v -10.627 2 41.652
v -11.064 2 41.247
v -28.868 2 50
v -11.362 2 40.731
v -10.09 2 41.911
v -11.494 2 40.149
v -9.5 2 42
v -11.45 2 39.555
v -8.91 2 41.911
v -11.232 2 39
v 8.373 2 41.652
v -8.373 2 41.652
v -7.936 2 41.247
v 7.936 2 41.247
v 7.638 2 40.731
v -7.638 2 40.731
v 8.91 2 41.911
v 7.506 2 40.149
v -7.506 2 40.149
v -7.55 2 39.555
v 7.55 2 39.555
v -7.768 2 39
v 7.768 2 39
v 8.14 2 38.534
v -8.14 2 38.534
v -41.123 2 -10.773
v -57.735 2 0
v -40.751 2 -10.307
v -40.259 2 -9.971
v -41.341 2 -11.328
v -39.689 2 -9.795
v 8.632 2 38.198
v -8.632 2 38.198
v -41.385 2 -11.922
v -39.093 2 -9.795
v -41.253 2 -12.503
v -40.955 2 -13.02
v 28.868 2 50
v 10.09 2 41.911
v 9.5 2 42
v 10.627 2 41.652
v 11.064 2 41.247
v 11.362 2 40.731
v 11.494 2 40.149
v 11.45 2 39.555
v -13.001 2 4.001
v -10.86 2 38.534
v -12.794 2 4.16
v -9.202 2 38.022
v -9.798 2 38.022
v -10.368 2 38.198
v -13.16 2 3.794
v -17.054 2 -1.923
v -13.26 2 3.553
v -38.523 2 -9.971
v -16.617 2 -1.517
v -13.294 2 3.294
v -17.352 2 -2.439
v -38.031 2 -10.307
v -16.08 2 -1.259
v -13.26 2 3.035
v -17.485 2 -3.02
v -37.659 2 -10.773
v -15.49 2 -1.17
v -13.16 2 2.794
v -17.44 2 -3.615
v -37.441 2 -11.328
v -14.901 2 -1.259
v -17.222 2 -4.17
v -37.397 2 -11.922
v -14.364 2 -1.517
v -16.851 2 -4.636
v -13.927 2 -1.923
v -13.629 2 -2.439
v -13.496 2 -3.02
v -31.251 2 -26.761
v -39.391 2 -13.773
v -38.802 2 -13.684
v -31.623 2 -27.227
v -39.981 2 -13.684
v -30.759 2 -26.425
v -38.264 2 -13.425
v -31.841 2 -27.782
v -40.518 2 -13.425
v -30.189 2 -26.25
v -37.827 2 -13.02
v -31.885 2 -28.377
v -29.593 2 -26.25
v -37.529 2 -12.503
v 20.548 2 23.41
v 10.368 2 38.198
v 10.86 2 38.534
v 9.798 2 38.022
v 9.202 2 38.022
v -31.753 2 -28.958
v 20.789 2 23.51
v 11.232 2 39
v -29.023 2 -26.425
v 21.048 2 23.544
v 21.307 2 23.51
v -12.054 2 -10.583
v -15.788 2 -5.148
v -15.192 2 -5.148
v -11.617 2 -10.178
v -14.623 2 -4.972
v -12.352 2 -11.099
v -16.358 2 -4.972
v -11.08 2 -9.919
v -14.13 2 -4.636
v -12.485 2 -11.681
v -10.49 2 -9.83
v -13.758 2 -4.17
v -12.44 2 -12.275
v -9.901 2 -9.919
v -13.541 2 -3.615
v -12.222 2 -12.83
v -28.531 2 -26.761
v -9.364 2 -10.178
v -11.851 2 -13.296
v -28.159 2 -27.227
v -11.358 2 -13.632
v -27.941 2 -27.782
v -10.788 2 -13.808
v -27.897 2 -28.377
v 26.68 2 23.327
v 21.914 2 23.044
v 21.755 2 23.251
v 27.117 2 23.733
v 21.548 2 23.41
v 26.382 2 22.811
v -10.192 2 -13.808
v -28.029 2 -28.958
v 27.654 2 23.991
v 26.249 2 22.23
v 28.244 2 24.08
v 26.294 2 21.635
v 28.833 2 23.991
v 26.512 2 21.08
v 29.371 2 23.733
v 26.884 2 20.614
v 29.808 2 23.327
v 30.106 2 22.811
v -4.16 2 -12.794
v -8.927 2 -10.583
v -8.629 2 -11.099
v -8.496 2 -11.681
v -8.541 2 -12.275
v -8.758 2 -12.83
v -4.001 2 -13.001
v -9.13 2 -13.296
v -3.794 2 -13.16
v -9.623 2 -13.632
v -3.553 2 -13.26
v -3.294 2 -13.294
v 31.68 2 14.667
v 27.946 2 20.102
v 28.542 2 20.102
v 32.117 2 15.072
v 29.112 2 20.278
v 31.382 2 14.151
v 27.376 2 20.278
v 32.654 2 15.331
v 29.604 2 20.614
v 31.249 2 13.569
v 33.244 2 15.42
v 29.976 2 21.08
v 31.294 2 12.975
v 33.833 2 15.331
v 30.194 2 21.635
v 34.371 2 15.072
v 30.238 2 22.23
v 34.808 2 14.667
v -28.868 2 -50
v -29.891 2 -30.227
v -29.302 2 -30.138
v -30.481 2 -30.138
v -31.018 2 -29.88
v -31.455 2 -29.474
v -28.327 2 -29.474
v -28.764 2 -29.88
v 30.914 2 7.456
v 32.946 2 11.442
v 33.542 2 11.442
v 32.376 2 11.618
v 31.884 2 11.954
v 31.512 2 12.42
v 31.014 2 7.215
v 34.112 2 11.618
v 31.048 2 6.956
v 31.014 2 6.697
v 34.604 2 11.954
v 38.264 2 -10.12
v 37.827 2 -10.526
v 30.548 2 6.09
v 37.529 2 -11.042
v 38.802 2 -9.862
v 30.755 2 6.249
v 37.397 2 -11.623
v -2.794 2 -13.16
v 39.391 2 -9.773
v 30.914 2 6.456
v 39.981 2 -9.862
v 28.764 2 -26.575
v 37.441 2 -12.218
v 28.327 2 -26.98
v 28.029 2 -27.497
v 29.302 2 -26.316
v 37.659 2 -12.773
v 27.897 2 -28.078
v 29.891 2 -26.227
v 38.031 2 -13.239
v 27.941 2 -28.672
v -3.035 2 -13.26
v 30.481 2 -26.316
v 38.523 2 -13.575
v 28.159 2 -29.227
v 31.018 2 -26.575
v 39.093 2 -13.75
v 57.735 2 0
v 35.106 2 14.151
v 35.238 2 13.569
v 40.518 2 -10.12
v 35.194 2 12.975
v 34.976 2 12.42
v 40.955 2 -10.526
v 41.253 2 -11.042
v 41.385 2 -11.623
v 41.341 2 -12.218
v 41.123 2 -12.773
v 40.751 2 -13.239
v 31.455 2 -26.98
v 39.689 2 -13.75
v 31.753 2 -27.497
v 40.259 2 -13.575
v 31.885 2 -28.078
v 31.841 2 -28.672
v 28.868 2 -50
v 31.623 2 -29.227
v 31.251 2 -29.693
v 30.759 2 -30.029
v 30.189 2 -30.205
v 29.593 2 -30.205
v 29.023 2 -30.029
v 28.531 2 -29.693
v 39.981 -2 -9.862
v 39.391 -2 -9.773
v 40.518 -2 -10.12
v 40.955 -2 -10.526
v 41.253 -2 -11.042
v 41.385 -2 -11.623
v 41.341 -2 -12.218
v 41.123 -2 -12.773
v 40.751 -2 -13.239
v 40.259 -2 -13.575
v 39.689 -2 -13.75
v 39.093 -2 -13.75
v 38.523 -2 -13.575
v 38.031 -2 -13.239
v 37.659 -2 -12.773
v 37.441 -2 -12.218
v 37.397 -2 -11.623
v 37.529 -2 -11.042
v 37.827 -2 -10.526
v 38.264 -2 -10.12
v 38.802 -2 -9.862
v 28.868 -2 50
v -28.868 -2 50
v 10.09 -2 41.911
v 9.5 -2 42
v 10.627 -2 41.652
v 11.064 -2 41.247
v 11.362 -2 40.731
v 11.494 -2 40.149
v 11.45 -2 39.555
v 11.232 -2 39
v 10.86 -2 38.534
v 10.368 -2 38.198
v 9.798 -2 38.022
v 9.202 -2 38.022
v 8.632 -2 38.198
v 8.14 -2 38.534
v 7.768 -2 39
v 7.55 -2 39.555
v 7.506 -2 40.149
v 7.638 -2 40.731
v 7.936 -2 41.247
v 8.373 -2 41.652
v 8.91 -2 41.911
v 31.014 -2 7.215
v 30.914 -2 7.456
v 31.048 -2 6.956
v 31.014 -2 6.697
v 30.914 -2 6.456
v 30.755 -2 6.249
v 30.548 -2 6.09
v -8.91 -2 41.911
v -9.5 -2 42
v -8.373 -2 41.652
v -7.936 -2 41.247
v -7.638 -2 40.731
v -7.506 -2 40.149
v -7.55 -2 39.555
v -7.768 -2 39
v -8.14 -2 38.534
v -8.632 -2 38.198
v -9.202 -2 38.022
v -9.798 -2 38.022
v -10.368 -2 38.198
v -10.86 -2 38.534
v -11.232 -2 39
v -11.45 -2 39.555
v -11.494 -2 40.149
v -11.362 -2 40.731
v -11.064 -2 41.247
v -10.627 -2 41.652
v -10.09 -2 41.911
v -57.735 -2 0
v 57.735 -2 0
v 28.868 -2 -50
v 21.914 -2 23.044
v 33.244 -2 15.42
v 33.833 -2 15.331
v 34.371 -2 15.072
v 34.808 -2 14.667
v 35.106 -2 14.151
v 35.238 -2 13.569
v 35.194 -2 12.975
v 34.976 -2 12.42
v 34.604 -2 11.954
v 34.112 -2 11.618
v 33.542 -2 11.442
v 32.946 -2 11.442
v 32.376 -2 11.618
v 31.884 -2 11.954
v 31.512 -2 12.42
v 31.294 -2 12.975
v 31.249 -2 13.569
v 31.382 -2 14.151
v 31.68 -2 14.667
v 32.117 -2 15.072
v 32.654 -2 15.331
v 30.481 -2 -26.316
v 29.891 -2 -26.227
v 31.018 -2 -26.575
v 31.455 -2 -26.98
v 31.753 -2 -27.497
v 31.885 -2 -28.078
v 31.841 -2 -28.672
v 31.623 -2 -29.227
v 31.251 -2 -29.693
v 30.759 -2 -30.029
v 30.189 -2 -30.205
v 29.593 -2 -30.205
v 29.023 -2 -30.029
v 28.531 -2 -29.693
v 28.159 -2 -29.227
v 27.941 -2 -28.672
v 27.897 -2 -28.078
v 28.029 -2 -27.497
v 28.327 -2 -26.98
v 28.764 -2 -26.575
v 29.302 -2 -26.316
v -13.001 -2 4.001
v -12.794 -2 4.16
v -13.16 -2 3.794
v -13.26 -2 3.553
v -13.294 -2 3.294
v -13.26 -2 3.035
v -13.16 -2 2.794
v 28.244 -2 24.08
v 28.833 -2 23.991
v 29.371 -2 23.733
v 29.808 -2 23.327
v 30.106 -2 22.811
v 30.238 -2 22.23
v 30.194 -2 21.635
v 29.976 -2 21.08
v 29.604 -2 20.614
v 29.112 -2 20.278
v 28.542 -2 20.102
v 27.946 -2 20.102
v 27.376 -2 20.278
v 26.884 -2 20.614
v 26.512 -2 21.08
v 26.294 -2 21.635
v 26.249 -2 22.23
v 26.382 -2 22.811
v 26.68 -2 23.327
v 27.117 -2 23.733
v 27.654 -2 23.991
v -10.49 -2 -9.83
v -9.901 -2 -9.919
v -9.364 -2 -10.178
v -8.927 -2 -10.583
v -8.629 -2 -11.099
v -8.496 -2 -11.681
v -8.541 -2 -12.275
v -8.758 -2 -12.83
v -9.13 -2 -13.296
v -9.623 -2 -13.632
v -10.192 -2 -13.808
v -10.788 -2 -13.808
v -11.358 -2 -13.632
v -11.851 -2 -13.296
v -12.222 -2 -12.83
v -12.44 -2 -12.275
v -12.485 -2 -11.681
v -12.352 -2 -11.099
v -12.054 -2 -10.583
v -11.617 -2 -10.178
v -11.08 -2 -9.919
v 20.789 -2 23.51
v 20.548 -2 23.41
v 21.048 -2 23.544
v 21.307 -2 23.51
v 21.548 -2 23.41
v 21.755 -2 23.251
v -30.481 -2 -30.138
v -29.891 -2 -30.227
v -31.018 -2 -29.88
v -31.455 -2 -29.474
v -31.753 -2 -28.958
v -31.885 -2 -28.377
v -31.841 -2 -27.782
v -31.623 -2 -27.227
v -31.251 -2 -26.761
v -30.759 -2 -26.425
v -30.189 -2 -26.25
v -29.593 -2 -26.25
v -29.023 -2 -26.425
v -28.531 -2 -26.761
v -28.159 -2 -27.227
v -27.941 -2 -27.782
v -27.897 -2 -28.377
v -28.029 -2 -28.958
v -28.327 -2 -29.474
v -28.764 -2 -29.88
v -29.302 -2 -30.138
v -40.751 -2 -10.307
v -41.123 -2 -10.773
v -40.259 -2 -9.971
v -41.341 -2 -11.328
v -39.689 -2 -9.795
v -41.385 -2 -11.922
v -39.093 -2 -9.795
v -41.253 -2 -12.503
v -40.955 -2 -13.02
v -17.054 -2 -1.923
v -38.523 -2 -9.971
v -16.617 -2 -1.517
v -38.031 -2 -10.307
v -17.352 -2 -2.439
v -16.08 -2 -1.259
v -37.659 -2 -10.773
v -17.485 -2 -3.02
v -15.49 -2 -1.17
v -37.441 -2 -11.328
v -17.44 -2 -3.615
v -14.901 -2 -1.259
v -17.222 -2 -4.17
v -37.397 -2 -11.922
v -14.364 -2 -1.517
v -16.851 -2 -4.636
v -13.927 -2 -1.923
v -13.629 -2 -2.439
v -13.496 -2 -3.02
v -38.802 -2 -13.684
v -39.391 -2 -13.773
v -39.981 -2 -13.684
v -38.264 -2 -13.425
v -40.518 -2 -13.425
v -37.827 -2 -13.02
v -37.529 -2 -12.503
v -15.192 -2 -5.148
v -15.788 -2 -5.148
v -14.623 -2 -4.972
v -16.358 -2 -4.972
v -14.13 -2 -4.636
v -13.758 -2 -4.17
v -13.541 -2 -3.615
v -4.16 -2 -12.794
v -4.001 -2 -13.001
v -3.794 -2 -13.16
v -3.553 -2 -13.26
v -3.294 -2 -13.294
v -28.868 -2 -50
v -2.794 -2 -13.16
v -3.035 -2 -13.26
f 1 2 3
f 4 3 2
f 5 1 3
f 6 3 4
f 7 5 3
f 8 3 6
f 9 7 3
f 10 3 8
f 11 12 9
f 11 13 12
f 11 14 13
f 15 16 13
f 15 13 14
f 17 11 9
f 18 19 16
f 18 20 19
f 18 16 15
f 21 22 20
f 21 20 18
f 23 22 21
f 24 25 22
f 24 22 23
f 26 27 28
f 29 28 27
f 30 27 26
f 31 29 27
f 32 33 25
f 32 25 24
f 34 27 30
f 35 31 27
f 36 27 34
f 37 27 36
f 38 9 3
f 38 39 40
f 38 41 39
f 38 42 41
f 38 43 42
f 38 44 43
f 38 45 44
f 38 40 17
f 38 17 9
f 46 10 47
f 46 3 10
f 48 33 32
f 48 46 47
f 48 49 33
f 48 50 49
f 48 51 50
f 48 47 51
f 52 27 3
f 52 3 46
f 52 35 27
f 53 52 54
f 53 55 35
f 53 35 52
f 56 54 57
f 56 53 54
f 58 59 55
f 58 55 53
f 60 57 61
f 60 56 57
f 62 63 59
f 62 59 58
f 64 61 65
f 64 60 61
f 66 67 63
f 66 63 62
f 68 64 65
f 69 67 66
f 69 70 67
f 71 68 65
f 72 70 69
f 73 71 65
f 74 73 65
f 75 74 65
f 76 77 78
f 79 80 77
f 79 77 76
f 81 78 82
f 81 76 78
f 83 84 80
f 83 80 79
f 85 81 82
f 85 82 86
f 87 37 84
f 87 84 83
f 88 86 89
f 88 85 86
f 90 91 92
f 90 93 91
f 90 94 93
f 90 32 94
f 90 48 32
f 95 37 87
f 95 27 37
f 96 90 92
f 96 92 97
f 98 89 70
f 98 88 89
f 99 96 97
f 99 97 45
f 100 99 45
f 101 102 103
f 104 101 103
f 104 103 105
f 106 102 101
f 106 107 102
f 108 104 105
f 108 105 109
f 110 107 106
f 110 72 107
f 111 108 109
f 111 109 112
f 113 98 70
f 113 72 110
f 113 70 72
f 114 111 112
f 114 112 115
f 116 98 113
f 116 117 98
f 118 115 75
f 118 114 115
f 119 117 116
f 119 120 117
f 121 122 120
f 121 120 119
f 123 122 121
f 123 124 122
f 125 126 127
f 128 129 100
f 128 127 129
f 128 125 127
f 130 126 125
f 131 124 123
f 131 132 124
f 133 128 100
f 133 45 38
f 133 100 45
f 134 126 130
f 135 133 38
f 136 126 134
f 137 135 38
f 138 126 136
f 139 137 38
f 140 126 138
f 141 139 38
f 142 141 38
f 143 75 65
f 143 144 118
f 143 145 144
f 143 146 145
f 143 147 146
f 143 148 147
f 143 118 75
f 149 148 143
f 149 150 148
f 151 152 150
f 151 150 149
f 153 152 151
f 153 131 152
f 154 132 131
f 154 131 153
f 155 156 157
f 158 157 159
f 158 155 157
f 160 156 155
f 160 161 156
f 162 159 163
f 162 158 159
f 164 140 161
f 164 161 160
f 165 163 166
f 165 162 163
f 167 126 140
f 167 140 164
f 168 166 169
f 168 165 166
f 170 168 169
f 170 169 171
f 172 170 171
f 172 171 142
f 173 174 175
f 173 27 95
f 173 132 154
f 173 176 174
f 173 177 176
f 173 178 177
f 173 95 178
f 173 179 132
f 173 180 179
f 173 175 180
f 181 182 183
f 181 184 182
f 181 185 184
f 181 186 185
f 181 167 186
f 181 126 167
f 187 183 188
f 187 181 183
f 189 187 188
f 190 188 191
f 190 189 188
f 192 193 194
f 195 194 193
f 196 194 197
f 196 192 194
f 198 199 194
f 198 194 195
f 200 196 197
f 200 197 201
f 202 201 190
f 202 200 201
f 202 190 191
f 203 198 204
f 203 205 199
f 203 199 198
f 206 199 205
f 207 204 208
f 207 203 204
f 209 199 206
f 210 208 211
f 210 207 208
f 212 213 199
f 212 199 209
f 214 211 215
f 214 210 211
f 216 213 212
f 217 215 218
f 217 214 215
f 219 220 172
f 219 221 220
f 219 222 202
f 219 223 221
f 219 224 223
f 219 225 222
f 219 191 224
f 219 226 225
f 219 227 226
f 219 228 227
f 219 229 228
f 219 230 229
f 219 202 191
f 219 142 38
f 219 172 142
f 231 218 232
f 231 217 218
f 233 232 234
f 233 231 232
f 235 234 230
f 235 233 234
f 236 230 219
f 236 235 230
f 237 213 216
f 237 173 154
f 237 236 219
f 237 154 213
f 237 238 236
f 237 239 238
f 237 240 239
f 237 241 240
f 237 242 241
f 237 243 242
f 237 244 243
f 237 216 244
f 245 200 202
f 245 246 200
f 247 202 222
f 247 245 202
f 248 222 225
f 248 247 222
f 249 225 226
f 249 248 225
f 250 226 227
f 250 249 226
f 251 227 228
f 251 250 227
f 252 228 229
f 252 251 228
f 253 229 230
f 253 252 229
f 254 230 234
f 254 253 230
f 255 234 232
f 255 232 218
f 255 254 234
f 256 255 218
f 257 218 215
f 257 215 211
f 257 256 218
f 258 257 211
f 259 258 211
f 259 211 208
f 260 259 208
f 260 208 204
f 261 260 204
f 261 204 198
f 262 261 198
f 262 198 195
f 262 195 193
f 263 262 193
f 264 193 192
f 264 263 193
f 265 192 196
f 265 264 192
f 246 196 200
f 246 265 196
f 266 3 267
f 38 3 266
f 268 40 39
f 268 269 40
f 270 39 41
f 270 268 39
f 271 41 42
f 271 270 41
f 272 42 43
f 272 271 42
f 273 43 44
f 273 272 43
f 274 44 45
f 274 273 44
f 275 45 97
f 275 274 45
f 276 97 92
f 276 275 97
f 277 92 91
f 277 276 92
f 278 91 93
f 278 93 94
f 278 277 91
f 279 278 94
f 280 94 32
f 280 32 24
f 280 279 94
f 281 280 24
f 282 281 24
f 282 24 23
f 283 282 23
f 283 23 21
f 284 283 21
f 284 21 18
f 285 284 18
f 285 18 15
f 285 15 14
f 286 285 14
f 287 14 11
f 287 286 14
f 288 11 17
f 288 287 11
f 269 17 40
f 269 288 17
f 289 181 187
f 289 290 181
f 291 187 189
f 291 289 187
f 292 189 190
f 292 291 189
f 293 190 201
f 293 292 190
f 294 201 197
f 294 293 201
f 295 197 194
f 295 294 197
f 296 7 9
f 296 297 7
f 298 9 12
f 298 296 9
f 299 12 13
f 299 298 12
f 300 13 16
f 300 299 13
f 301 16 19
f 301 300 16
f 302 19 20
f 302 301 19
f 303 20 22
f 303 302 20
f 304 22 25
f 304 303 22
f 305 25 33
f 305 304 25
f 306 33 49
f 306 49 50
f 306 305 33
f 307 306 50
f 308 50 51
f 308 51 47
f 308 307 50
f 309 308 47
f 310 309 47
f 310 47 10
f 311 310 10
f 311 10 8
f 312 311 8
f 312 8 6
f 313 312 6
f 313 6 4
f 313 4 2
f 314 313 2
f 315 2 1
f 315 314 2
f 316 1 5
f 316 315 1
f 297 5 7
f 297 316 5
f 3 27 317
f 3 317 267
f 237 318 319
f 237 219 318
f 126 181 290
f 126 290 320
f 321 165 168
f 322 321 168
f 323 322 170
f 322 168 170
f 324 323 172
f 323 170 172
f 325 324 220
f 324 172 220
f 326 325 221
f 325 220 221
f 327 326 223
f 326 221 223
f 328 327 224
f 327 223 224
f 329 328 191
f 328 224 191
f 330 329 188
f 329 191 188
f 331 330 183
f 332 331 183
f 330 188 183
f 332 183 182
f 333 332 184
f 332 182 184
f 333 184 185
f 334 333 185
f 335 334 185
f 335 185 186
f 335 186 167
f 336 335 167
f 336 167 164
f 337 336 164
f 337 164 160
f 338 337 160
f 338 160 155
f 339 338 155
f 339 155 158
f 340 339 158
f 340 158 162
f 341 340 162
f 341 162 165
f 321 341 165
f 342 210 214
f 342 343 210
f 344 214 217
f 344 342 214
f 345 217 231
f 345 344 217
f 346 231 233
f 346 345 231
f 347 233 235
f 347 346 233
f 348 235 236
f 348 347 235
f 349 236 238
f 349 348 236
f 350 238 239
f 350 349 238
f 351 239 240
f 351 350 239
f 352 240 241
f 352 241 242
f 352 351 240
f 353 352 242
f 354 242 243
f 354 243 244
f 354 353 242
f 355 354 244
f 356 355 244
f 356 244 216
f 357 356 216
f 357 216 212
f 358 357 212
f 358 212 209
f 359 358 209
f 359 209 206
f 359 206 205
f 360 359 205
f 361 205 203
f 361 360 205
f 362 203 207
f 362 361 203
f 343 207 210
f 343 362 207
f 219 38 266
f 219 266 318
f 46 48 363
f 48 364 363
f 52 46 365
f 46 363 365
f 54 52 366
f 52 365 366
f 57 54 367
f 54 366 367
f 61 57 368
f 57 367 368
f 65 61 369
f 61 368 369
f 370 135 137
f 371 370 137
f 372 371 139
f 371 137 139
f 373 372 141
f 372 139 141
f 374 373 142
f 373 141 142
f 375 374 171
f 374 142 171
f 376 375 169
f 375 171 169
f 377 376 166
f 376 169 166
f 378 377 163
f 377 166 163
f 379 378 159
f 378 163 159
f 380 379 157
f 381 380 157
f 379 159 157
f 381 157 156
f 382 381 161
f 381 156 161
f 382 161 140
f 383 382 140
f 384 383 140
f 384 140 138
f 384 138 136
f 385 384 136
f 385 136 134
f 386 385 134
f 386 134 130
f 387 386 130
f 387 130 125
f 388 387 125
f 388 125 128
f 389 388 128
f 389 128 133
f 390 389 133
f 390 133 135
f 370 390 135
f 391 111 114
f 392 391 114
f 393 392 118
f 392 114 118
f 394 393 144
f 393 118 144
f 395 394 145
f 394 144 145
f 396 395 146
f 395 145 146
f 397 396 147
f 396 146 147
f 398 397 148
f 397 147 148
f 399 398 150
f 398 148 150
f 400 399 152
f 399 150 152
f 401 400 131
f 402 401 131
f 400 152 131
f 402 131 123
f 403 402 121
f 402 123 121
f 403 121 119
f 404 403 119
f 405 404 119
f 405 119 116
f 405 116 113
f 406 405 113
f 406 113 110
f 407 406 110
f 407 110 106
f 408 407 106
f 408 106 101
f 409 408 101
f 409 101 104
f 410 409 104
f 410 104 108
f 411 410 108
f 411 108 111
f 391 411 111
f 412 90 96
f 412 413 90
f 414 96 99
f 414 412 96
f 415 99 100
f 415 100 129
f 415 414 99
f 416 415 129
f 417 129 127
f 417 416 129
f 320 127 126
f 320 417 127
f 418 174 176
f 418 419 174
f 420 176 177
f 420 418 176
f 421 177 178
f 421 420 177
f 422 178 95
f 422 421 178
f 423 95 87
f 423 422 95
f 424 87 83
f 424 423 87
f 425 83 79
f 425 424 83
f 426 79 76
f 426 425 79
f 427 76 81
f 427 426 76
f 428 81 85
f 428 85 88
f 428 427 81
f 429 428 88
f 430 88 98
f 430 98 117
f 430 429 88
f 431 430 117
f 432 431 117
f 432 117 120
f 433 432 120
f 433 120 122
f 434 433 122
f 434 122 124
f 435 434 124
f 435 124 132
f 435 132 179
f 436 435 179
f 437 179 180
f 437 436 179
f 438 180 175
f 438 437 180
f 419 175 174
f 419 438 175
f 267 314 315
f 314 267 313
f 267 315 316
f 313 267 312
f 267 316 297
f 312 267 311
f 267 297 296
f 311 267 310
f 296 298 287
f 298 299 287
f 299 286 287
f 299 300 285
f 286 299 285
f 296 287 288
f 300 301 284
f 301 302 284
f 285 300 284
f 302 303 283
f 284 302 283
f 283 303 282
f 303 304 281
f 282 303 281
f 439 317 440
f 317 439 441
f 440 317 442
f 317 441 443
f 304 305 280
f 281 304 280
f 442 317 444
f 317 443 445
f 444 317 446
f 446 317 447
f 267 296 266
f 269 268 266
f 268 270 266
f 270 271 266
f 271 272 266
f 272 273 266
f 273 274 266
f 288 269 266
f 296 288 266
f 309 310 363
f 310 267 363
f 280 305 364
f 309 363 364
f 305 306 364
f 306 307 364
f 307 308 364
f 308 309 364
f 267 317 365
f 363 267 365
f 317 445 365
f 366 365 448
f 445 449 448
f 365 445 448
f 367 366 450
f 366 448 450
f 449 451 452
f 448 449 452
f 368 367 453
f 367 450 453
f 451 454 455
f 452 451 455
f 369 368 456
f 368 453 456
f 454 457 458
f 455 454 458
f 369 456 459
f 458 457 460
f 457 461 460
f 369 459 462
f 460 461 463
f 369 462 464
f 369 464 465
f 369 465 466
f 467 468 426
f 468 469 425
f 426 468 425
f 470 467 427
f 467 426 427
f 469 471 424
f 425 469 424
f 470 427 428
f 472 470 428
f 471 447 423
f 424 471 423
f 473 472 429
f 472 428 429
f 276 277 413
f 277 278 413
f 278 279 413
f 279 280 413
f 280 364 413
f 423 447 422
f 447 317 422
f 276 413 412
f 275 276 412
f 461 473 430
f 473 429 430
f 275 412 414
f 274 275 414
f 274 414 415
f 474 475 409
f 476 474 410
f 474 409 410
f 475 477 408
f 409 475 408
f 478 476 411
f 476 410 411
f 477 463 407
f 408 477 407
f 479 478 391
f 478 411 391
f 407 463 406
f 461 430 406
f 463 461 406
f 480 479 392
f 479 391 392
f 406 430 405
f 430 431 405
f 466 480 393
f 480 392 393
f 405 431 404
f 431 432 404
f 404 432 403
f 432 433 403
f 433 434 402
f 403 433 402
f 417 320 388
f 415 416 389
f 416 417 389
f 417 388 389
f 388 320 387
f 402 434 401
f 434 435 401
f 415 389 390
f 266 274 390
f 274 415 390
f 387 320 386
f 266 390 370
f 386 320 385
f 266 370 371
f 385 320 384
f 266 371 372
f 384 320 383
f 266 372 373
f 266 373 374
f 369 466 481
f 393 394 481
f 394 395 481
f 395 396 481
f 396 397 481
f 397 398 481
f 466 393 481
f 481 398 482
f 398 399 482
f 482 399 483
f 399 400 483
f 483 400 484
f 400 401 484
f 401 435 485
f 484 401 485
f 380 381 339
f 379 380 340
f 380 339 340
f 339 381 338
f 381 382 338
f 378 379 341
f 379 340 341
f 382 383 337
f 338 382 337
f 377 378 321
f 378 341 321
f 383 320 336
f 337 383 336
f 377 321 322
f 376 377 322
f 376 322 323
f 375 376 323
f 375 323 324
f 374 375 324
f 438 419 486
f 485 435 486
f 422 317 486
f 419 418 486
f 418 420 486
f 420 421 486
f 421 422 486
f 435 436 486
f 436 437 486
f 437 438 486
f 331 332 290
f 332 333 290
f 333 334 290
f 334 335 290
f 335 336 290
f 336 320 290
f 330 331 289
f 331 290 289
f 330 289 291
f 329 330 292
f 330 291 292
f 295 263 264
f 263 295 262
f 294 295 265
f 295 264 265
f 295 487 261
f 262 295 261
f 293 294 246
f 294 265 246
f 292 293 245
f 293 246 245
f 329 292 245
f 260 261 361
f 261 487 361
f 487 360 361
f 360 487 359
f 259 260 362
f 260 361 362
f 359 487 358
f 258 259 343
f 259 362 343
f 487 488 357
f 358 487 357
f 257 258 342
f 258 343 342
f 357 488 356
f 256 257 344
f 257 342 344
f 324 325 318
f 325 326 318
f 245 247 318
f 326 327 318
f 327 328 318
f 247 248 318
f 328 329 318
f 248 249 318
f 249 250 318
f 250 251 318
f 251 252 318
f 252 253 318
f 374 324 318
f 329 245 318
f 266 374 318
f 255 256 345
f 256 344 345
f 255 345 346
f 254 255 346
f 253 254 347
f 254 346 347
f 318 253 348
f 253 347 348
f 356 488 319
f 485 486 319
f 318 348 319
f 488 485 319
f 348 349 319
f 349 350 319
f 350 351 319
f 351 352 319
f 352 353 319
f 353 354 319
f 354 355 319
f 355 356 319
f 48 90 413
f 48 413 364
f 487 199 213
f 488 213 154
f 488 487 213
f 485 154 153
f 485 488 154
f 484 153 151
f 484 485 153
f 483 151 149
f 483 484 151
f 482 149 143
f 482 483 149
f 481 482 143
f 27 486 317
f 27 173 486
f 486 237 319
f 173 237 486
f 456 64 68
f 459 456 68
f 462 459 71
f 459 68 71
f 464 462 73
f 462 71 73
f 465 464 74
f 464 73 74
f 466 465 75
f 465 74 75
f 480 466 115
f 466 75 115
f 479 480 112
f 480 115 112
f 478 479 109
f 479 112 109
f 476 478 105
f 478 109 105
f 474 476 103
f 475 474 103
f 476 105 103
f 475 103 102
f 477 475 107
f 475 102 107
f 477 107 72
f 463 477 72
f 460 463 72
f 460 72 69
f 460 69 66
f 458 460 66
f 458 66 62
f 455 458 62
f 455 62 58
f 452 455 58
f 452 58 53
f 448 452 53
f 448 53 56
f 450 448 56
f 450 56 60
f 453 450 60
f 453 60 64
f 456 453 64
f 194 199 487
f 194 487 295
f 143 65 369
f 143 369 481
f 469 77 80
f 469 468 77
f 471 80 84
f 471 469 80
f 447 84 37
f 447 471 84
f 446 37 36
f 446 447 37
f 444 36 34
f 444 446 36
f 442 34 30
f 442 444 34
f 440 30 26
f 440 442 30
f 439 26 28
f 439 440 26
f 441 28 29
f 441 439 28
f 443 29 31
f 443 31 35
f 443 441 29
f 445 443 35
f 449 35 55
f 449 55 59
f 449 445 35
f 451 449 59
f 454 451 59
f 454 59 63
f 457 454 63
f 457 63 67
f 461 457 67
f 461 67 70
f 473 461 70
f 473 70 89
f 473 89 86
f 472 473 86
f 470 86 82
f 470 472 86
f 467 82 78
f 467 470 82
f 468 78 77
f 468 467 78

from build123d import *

# Parameters (mm, degrees)
SKETCH1_R           = 2
BOSS_EXTRUDE1_DEPTH = 2
SKETCH3_R           = 2
CUT_EXTRUDE1_DEPTH  = 10
FILLET1_R           = 1


with BuildPart() as part:
    # Sketch1 → Boss-Extrude1 (new, symmetric)
    with BuildSketch(Plane(origin=(0, 0, 0), x_dir=(1, 0, 0), z_dir=(0, 1, 0))):
        Polygon((-28.867513459, 50), (-57.735026919, 0), (-28.867513459, -50), (28.867513459, -50), (57.735026919, 0), (28.867513459, 50), align=None)
        with Locations(Location((29.891016151, 28.227241336, 0), (0, 0, 270))):
            Circle(SKETCH1_R, mode=Mode.SUBTRACT)
        with Locations(Location((39.391016151, 11.772758664, 0), (0, 0, 270))):
            Circle(SKETCH1_R, mode=Mode.SUBTRACT)
        with Locations(Location((-9.5, -40, 0), (0, 0, 270))):
            Circle(SKETCH1_R, mode=Mode.SUBTRACT)
        with Locations(Location((9.5, -40, 0), (0, 0, 270))):
            Circle(SKETCH1_R, mode=Mode.SUBTRACT)
        with Locations(Location((-39.391016151, 11.772758664, 0), (0, 0, 90))):
            Circle(SKETCH1_R, mode=Mode.SUBTRACT)
        with Locations(Location((-29.891016151, 28.227241336, 0), (0, 0, 90))):
            Circle(SKETCH1_R, mode=Mode.SUBTRACT)
    extrude(amount=BOSS_EXTRUDE1_DEPTH, both=True)

    # Sketch3 → Cut-Extrude1 (cut)
    with BuildSketch(Plane(origin=(0, 2, 0), x_dir=(1, 0, 0), z_dir=(0, 1, 0))):
        with Locations(Location((-10.490381057, 11.830127019, 0), (0, 0, 270))):
            Circle(SKETCH3_R)
        with Locations(Location((33.243901834, -13.419872981, 0), (0, 0, 270))):
            Circle(SKETCH3_R)
        with Locations(Location((28.243901834, -22.080127019, 0), (0, 0, 270))):
            Circle(SKETCH3_R)
        with Locations(Location((-15.490381057, 3.169872981, 0), (0, 0, 270))):
            Circle(SKETCH3_R)
        Polygon((-13.660254038, -3.660254038), (-3.660254038, 13.660254038), (31.413774815, -6.589745962), (21.413774815, -23.910254038), align=None)
    extrude(amount=-CUT_EXTRUDE1_DEPTH, mode=Mode.SUBTRACT)

    # Fillet1
    fillet1_edges = [part.edges().sort_by_distance(p)[0] for p in [
        (21.413774815, 0, 23.910254038),
        (-13.660254038, 0, 3.660254038),
        (-3.660254038, 0, -13.660254038),
        (31.413774815, 0, 6.589745962),
    ]]
    fillet(fillet1_edges, radius=FILLET1_R)


solid = part.part
